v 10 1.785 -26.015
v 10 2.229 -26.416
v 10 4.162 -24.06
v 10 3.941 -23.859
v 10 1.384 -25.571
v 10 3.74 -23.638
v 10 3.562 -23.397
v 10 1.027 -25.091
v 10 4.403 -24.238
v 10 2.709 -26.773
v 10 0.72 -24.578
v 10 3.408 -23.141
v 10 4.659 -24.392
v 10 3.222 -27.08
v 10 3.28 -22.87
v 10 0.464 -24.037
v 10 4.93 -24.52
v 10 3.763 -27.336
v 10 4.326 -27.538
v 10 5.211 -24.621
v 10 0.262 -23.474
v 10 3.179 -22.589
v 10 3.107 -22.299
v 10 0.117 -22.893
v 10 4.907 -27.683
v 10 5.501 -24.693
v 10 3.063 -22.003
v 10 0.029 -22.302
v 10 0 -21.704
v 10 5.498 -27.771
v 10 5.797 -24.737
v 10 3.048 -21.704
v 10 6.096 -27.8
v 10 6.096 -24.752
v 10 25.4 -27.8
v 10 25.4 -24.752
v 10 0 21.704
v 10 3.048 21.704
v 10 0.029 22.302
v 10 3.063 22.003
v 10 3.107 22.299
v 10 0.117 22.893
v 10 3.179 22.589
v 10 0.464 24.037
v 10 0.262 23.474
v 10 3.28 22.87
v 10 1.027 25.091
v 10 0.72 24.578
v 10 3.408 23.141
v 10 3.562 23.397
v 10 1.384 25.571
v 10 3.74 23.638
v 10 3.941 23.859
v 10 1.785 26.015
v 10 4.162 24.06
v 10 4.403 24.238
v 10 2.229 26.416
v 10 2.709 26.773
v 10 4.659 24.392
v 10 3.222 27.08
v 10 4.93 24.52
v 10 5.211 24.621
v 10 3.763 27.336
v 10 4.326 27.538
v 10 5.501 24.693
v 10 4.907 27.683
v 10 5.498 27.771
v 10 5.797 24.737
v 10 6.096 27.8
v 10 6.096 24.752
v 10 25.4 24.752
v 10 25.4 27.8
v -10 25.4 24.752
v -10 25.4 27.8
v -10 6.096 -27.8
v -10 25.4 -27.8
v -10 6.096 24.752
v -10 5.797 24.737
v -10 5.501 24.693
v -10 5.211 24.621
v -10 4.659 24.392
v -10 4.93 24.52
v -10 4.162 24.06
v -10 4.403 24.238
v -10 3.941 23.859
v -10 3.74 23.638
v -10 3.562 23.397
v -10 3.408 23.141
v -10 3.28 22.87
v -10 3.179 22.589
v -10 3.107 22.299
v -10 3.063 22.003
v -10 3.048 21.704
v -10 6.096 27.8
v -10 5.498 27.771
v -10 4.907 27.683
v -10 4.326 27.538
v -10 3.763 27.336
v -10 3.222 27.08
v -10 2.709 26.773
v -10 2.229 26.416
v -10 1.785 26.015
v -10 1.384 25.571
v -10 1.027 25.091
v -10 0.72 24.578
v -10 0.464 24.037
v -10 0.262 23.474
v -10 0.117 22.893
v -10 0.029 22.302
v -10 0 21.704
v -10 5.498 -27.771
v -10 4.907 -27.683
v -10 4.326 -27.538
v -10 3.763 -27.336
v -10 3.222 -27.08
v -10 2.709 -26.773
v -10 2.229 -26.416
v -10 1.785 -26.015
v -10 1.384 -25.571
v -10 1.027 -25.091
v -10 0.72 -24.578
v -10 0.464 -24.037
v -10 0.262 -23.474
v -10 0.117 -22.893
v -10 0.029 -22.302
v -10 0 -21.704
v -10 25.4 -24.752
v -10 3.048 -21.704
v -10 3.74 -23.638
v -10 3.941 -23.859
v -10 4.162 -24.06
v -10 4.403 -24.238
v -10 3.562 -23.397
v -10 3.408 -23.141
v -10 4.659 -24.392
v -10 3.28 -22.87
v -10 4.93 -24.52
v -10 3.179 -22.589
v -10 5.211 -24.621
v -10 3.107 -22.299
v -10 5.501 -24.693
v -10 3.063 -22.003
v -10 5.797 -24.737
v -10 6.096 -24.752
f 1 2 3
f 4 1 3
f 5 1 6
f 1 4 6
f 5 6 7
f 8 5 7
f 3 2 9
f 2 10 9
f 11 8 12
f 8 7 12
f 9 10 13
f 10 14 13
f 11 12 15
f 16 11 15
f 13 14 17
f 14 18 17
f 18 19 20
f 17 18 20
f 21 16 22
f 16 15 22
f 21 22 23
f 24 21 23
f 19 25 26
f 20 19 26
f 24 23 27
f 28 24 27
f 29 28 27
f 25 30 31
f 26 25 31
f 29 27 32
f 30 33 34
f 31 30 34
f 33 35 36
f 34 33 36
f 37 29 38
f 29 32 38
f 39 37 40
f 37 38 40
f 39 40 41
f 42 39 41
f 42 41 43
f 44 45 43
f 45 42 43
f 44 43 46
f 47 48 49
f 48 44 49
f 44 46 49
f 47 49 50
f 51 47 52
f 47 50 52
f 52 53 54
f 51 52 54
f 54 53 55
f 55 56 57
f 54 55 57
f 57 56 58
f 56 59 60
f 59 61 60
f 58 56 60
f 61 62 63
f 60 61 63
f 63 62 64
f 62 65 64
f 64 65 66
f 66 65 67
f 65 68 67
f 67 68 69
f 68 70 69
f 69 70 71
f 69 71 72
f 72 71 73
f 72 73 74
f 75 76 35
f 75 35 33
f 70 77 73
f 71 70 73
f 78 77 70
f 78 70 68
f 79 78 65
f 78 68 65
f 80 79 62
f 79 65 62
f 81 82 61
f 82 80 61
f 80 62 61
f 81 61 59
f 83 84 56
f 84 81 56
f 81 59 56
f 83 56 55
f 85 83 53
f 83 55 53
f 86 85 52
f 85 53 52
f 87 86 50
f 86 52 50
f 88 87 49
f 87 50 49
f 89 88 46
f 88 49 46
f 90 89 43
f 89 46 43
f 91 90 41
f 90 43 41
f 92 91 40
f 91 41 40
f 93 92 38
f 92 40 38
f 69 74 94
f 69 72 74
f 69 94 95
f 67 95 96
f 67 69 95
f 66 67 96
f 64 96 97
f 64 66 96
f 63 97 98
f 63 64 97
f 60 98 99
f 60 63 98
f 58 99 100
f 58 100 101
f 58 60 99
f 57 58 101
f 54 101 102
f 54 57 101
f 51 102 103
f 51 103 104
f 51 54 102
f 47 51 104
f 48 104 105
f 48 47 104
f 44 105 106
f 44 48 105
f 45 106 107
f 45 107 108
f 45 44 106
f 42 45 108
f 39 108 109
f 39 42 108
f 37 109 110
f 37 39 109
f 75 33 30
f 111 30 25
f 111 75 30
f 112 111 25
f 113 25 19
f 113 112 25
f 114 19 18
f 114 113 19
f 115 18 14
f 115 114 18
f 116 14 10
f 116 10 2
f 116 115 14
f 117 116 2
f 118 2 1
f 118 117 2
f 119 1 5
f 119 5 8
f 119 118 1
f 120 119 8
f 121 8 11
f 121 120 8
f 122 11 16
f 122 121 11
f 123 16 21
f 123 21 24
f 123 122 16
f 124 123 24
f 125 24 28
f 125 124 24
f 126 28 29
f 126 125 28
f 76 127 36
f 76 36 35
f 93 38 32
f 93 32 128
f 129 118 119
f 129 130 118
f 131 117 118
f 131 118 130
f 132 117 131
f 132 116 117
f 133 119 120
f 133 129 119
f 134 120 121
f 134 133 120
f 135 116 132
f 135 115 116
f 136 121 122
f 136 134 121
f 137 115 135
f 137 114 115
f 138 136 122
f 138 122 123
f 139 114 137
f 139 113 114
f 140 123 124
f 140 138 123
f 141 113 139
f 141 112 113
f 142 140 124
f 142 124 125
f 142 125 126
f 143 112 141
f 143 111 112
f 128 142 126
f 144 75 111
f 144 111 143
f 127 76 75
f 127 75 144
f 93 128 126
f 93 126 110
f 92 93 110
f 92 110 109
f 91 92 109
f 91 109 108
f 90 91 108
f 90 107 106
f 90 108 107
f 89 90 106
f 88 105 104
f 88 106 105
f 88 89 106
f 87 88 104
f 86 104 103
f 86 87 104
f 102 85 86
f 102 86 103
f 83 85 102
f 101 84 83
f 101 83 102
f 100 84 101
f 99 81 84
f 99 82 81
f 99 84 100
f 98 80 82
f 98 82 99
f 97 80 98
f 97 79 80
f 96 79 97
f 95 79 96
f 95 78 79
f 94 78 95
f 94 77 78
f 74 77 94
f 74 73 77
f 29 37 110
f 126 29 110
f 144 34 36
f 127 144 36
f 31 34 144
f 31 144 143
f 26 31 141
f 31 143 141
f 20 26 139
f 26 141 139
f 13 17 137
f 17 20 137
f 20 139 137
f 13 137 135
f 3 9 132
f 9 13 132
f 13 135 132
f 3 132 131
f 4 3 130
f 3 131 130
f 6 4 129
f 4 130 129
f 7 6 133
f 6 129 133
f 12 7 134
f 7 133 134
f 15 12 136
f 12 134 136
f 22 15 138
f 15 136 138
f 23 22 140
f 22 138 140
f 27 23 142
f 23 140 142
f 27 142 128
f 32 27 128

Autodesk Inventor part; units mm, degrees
ref_plane "YZ Plane" through (0, 0, 0) normal (1, 0, 0) x (0, 1, 0)
ref_plane "XZ Plane" through (0, 0, 0) normal (0, 1, 0) x (-1, 0, 0)
ref_plane "XY Plane" through (0, 0, 0) normal (0, 0, 1) x (1, 0, 0)
sketch "Sketch1" plane through (0, 0, 0) normal (0, 1, 0) x (-1, 0, 0)
  line L0 (10, 27.8) -> (-10, 27.8)
  line L1 (-10, 27.8) -> (-10, -27.8)
  line L2 (-10, -27.8) -> (10, -27.8)
  line L3 (10, -27.8) -> (10, 27.8)
  line L4 (10, 27.8) -> (-10, -27.8) construction
  line L5 (-10, 27.8) -> (10, -27.8) construction
  point P0 (0, 0)
  dimension "d0" = 55.6
  dimension "d1" = 20
extrude "Plate1" add sketch "Sketch1" along normal blind 3.048
sketch "Sketch2" plane through (10, 0, 27.8) normal (0, 0, -1) x (-1, 0, 0)
  line L0 (20, 3.048) -> (0, 3.048)
  line L1 (0, 3.048) -> (0, 25.4)
  line L2 (0, 25.4) -> (20, 25.4)
  line L3 (20, 25.4) -> (20, 3.048)
edge flange "Flange1" height 25.4 angle 90 thickness 3.048 bend radius 3.048 thickness toward (0, 0, -1) relief tear relief width 3.048 relief depth 1.524 edges at (0, 3.048, 27.8) wall of the first edge with corners at (-10, 3.048, 27.8) (10, 3.048, 27.8) (10, 25.4, 27.8) (-10, 25.4, 27.8)
bend "Bend1"
corner "Corner1"
sketch "Sketch3" plane through (-10, 0, -27.8) normal (0, 0, 1) x (1, 0, 0)
  line L0 (20, 3.048) -> (0, 3.048)
  line L1 (0, 3.048) -> (0, 25.4)
  line L2 (0, 25.4) -> (20, 25.4)
  line L3 (20, 25.4) -> (20, 3.048)
edge flange "Flange2" height 25.4 angle 90 thickness 3.048 bend radius 3.048 thickness toward (0, 0, 1) relief tear relief width 3.048 relief depth 1.524 edges at (0, 3.048, -27.8) wall of the first edge with corners at (10, 3.048, -27.8) (-10, 3.048, -27.8) (-10, 25.4, -27.8) (10, 25.4, -27.8)
bend "Bend2"
corner "Corner2"
equation "\"d2\" = Thickness"
equation "\"d3\" = BendReliefWidth"
equation "\"d4\" = BendReliefDepth"
equation "\"d5\" = MinimumRemnant"
equation "\"d6\" = TransitionRadius"
equation "\"d9\" = BendRadius"
equation "\"d10\" = CornerReliefSize"
equation "\"d11\" = GapSize"
equation "\"d12\" = JacobiRadiusSize"
equation "\"d13\" = BendReliefWidth"
equation "\"d14\" = BendReliefDepth"
equation "\"d15\" = MinimumRemnant"
equation "\"d16\" = TransitionRadius"
equation "\"d19\" = BendRadius"
equation "\"d20\" = CornerReliefSize"
equation "\"d21\" = GapSize"
equation "\"d22\" = JacobiRadiusSize"
equation "\"BendRadius\" = Thickness"
equation "\"BendReliefWidth\" = Thickness"
equation "\"BendReliefDepth\" = 0.5 * Thickness"
equation "\"CornerReliefSize\" = 4 * Thickness"
equation "\"MinimumRemnant\" = 2 * Thickness"
equation "\"TransitionRadius\" = BendRadius"
equation "\"JacobiRadiusSize\" = BendRadius"
equation "\"GapSize\" = Thickness"
equation "\"Thickness\" = 3.048"
properties part number "bracket1"
